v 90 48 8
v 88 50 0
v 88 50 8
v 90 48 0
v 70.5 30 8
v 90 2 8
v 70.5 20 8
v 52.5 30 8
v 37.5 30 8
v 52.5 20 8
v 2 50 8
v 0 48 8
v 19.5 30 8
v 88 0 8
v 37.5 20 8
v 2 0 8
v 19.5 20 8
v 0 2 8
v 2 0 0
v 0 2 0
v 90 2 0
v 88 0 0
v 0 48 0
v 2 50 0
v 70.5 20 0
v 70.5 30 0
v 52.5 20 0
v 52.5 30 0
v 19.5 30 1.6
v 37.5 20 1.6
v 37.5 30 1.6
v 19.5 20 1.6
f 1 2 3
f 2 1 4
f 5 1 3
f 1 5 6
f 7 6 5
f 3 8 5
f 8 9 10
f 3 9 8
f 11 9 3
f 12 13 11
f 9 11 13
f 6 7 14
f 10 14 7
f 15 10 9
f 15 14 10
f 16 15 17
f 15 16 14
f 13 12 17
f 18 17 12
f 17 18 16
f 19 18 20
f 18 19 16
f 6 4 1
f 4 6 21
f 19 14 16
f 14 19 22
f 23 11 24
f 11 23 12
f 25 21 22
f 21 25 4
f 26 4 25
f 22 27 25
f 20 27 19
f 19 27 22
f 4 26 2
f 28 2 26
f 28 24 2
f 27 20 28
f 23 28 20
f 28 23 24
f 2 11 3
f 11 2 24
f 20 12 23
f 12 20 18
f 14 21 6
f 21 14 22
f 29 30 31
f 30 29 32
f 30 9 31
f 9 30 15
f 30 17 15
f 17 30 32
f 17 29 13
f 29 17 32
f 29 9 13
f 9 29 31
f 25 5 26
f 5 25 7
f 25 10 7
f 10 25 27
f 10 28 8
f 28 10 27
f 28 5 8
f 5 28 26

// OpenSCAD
$fn = 32;

// ----------------------------------------------------------------------
// Windowed plate: 2 voids, 90 x 50 x 8 mm
// ----------------------------------------------------------------------

// --- parameters (mm) ---
plate_l = 90;             // plate length, X
plate_w = 50;             // plate width, Y
plate_t = 8;              // plate thickness, Z
edge_margin = 12;         // wall from the plate edge to any window
windows = 2;              // number of windows in the row
win_l = 18;               // window length
win_w = 10;               // window width
win_pitch = 33;           // window pitch along X
depth_1 = 6.4;            // depth of void 1 (full thickness = through)
depth_2 = 8;              // depth of void 2 (full thickness = through)
corner_c = 2;             // corner chamfer of the plate

profile = [[2, 0], [88, 0], [90, 2], [90, 48], [88, 50], [2, 50], [0, 48], [0, 2]];  // primary outline, 8 points, counter clockwise
void_1 = [[19.5, 20], [37.5, 20], [37.5, 30], [19.5, 30]];  // window 1 of the row, 4 points
void_2 = [[52.5, 20], [70.5, 20], [70.5, 30], [52.5, 30]];  // window 2 of the row, 4 points

// --- the one profile operation ---
difference() {
  linear_extrude(height = plate_t) polygon(points = profile);
  translate([0, 0, plate_t - depth_1])
    linear_extrude(height = depth_1 + 1) polygon(points = void_1);
  translate([0, 0, -1])
    linear_extrude(height = plate_t + 2) polygon(points = void_2);
}
